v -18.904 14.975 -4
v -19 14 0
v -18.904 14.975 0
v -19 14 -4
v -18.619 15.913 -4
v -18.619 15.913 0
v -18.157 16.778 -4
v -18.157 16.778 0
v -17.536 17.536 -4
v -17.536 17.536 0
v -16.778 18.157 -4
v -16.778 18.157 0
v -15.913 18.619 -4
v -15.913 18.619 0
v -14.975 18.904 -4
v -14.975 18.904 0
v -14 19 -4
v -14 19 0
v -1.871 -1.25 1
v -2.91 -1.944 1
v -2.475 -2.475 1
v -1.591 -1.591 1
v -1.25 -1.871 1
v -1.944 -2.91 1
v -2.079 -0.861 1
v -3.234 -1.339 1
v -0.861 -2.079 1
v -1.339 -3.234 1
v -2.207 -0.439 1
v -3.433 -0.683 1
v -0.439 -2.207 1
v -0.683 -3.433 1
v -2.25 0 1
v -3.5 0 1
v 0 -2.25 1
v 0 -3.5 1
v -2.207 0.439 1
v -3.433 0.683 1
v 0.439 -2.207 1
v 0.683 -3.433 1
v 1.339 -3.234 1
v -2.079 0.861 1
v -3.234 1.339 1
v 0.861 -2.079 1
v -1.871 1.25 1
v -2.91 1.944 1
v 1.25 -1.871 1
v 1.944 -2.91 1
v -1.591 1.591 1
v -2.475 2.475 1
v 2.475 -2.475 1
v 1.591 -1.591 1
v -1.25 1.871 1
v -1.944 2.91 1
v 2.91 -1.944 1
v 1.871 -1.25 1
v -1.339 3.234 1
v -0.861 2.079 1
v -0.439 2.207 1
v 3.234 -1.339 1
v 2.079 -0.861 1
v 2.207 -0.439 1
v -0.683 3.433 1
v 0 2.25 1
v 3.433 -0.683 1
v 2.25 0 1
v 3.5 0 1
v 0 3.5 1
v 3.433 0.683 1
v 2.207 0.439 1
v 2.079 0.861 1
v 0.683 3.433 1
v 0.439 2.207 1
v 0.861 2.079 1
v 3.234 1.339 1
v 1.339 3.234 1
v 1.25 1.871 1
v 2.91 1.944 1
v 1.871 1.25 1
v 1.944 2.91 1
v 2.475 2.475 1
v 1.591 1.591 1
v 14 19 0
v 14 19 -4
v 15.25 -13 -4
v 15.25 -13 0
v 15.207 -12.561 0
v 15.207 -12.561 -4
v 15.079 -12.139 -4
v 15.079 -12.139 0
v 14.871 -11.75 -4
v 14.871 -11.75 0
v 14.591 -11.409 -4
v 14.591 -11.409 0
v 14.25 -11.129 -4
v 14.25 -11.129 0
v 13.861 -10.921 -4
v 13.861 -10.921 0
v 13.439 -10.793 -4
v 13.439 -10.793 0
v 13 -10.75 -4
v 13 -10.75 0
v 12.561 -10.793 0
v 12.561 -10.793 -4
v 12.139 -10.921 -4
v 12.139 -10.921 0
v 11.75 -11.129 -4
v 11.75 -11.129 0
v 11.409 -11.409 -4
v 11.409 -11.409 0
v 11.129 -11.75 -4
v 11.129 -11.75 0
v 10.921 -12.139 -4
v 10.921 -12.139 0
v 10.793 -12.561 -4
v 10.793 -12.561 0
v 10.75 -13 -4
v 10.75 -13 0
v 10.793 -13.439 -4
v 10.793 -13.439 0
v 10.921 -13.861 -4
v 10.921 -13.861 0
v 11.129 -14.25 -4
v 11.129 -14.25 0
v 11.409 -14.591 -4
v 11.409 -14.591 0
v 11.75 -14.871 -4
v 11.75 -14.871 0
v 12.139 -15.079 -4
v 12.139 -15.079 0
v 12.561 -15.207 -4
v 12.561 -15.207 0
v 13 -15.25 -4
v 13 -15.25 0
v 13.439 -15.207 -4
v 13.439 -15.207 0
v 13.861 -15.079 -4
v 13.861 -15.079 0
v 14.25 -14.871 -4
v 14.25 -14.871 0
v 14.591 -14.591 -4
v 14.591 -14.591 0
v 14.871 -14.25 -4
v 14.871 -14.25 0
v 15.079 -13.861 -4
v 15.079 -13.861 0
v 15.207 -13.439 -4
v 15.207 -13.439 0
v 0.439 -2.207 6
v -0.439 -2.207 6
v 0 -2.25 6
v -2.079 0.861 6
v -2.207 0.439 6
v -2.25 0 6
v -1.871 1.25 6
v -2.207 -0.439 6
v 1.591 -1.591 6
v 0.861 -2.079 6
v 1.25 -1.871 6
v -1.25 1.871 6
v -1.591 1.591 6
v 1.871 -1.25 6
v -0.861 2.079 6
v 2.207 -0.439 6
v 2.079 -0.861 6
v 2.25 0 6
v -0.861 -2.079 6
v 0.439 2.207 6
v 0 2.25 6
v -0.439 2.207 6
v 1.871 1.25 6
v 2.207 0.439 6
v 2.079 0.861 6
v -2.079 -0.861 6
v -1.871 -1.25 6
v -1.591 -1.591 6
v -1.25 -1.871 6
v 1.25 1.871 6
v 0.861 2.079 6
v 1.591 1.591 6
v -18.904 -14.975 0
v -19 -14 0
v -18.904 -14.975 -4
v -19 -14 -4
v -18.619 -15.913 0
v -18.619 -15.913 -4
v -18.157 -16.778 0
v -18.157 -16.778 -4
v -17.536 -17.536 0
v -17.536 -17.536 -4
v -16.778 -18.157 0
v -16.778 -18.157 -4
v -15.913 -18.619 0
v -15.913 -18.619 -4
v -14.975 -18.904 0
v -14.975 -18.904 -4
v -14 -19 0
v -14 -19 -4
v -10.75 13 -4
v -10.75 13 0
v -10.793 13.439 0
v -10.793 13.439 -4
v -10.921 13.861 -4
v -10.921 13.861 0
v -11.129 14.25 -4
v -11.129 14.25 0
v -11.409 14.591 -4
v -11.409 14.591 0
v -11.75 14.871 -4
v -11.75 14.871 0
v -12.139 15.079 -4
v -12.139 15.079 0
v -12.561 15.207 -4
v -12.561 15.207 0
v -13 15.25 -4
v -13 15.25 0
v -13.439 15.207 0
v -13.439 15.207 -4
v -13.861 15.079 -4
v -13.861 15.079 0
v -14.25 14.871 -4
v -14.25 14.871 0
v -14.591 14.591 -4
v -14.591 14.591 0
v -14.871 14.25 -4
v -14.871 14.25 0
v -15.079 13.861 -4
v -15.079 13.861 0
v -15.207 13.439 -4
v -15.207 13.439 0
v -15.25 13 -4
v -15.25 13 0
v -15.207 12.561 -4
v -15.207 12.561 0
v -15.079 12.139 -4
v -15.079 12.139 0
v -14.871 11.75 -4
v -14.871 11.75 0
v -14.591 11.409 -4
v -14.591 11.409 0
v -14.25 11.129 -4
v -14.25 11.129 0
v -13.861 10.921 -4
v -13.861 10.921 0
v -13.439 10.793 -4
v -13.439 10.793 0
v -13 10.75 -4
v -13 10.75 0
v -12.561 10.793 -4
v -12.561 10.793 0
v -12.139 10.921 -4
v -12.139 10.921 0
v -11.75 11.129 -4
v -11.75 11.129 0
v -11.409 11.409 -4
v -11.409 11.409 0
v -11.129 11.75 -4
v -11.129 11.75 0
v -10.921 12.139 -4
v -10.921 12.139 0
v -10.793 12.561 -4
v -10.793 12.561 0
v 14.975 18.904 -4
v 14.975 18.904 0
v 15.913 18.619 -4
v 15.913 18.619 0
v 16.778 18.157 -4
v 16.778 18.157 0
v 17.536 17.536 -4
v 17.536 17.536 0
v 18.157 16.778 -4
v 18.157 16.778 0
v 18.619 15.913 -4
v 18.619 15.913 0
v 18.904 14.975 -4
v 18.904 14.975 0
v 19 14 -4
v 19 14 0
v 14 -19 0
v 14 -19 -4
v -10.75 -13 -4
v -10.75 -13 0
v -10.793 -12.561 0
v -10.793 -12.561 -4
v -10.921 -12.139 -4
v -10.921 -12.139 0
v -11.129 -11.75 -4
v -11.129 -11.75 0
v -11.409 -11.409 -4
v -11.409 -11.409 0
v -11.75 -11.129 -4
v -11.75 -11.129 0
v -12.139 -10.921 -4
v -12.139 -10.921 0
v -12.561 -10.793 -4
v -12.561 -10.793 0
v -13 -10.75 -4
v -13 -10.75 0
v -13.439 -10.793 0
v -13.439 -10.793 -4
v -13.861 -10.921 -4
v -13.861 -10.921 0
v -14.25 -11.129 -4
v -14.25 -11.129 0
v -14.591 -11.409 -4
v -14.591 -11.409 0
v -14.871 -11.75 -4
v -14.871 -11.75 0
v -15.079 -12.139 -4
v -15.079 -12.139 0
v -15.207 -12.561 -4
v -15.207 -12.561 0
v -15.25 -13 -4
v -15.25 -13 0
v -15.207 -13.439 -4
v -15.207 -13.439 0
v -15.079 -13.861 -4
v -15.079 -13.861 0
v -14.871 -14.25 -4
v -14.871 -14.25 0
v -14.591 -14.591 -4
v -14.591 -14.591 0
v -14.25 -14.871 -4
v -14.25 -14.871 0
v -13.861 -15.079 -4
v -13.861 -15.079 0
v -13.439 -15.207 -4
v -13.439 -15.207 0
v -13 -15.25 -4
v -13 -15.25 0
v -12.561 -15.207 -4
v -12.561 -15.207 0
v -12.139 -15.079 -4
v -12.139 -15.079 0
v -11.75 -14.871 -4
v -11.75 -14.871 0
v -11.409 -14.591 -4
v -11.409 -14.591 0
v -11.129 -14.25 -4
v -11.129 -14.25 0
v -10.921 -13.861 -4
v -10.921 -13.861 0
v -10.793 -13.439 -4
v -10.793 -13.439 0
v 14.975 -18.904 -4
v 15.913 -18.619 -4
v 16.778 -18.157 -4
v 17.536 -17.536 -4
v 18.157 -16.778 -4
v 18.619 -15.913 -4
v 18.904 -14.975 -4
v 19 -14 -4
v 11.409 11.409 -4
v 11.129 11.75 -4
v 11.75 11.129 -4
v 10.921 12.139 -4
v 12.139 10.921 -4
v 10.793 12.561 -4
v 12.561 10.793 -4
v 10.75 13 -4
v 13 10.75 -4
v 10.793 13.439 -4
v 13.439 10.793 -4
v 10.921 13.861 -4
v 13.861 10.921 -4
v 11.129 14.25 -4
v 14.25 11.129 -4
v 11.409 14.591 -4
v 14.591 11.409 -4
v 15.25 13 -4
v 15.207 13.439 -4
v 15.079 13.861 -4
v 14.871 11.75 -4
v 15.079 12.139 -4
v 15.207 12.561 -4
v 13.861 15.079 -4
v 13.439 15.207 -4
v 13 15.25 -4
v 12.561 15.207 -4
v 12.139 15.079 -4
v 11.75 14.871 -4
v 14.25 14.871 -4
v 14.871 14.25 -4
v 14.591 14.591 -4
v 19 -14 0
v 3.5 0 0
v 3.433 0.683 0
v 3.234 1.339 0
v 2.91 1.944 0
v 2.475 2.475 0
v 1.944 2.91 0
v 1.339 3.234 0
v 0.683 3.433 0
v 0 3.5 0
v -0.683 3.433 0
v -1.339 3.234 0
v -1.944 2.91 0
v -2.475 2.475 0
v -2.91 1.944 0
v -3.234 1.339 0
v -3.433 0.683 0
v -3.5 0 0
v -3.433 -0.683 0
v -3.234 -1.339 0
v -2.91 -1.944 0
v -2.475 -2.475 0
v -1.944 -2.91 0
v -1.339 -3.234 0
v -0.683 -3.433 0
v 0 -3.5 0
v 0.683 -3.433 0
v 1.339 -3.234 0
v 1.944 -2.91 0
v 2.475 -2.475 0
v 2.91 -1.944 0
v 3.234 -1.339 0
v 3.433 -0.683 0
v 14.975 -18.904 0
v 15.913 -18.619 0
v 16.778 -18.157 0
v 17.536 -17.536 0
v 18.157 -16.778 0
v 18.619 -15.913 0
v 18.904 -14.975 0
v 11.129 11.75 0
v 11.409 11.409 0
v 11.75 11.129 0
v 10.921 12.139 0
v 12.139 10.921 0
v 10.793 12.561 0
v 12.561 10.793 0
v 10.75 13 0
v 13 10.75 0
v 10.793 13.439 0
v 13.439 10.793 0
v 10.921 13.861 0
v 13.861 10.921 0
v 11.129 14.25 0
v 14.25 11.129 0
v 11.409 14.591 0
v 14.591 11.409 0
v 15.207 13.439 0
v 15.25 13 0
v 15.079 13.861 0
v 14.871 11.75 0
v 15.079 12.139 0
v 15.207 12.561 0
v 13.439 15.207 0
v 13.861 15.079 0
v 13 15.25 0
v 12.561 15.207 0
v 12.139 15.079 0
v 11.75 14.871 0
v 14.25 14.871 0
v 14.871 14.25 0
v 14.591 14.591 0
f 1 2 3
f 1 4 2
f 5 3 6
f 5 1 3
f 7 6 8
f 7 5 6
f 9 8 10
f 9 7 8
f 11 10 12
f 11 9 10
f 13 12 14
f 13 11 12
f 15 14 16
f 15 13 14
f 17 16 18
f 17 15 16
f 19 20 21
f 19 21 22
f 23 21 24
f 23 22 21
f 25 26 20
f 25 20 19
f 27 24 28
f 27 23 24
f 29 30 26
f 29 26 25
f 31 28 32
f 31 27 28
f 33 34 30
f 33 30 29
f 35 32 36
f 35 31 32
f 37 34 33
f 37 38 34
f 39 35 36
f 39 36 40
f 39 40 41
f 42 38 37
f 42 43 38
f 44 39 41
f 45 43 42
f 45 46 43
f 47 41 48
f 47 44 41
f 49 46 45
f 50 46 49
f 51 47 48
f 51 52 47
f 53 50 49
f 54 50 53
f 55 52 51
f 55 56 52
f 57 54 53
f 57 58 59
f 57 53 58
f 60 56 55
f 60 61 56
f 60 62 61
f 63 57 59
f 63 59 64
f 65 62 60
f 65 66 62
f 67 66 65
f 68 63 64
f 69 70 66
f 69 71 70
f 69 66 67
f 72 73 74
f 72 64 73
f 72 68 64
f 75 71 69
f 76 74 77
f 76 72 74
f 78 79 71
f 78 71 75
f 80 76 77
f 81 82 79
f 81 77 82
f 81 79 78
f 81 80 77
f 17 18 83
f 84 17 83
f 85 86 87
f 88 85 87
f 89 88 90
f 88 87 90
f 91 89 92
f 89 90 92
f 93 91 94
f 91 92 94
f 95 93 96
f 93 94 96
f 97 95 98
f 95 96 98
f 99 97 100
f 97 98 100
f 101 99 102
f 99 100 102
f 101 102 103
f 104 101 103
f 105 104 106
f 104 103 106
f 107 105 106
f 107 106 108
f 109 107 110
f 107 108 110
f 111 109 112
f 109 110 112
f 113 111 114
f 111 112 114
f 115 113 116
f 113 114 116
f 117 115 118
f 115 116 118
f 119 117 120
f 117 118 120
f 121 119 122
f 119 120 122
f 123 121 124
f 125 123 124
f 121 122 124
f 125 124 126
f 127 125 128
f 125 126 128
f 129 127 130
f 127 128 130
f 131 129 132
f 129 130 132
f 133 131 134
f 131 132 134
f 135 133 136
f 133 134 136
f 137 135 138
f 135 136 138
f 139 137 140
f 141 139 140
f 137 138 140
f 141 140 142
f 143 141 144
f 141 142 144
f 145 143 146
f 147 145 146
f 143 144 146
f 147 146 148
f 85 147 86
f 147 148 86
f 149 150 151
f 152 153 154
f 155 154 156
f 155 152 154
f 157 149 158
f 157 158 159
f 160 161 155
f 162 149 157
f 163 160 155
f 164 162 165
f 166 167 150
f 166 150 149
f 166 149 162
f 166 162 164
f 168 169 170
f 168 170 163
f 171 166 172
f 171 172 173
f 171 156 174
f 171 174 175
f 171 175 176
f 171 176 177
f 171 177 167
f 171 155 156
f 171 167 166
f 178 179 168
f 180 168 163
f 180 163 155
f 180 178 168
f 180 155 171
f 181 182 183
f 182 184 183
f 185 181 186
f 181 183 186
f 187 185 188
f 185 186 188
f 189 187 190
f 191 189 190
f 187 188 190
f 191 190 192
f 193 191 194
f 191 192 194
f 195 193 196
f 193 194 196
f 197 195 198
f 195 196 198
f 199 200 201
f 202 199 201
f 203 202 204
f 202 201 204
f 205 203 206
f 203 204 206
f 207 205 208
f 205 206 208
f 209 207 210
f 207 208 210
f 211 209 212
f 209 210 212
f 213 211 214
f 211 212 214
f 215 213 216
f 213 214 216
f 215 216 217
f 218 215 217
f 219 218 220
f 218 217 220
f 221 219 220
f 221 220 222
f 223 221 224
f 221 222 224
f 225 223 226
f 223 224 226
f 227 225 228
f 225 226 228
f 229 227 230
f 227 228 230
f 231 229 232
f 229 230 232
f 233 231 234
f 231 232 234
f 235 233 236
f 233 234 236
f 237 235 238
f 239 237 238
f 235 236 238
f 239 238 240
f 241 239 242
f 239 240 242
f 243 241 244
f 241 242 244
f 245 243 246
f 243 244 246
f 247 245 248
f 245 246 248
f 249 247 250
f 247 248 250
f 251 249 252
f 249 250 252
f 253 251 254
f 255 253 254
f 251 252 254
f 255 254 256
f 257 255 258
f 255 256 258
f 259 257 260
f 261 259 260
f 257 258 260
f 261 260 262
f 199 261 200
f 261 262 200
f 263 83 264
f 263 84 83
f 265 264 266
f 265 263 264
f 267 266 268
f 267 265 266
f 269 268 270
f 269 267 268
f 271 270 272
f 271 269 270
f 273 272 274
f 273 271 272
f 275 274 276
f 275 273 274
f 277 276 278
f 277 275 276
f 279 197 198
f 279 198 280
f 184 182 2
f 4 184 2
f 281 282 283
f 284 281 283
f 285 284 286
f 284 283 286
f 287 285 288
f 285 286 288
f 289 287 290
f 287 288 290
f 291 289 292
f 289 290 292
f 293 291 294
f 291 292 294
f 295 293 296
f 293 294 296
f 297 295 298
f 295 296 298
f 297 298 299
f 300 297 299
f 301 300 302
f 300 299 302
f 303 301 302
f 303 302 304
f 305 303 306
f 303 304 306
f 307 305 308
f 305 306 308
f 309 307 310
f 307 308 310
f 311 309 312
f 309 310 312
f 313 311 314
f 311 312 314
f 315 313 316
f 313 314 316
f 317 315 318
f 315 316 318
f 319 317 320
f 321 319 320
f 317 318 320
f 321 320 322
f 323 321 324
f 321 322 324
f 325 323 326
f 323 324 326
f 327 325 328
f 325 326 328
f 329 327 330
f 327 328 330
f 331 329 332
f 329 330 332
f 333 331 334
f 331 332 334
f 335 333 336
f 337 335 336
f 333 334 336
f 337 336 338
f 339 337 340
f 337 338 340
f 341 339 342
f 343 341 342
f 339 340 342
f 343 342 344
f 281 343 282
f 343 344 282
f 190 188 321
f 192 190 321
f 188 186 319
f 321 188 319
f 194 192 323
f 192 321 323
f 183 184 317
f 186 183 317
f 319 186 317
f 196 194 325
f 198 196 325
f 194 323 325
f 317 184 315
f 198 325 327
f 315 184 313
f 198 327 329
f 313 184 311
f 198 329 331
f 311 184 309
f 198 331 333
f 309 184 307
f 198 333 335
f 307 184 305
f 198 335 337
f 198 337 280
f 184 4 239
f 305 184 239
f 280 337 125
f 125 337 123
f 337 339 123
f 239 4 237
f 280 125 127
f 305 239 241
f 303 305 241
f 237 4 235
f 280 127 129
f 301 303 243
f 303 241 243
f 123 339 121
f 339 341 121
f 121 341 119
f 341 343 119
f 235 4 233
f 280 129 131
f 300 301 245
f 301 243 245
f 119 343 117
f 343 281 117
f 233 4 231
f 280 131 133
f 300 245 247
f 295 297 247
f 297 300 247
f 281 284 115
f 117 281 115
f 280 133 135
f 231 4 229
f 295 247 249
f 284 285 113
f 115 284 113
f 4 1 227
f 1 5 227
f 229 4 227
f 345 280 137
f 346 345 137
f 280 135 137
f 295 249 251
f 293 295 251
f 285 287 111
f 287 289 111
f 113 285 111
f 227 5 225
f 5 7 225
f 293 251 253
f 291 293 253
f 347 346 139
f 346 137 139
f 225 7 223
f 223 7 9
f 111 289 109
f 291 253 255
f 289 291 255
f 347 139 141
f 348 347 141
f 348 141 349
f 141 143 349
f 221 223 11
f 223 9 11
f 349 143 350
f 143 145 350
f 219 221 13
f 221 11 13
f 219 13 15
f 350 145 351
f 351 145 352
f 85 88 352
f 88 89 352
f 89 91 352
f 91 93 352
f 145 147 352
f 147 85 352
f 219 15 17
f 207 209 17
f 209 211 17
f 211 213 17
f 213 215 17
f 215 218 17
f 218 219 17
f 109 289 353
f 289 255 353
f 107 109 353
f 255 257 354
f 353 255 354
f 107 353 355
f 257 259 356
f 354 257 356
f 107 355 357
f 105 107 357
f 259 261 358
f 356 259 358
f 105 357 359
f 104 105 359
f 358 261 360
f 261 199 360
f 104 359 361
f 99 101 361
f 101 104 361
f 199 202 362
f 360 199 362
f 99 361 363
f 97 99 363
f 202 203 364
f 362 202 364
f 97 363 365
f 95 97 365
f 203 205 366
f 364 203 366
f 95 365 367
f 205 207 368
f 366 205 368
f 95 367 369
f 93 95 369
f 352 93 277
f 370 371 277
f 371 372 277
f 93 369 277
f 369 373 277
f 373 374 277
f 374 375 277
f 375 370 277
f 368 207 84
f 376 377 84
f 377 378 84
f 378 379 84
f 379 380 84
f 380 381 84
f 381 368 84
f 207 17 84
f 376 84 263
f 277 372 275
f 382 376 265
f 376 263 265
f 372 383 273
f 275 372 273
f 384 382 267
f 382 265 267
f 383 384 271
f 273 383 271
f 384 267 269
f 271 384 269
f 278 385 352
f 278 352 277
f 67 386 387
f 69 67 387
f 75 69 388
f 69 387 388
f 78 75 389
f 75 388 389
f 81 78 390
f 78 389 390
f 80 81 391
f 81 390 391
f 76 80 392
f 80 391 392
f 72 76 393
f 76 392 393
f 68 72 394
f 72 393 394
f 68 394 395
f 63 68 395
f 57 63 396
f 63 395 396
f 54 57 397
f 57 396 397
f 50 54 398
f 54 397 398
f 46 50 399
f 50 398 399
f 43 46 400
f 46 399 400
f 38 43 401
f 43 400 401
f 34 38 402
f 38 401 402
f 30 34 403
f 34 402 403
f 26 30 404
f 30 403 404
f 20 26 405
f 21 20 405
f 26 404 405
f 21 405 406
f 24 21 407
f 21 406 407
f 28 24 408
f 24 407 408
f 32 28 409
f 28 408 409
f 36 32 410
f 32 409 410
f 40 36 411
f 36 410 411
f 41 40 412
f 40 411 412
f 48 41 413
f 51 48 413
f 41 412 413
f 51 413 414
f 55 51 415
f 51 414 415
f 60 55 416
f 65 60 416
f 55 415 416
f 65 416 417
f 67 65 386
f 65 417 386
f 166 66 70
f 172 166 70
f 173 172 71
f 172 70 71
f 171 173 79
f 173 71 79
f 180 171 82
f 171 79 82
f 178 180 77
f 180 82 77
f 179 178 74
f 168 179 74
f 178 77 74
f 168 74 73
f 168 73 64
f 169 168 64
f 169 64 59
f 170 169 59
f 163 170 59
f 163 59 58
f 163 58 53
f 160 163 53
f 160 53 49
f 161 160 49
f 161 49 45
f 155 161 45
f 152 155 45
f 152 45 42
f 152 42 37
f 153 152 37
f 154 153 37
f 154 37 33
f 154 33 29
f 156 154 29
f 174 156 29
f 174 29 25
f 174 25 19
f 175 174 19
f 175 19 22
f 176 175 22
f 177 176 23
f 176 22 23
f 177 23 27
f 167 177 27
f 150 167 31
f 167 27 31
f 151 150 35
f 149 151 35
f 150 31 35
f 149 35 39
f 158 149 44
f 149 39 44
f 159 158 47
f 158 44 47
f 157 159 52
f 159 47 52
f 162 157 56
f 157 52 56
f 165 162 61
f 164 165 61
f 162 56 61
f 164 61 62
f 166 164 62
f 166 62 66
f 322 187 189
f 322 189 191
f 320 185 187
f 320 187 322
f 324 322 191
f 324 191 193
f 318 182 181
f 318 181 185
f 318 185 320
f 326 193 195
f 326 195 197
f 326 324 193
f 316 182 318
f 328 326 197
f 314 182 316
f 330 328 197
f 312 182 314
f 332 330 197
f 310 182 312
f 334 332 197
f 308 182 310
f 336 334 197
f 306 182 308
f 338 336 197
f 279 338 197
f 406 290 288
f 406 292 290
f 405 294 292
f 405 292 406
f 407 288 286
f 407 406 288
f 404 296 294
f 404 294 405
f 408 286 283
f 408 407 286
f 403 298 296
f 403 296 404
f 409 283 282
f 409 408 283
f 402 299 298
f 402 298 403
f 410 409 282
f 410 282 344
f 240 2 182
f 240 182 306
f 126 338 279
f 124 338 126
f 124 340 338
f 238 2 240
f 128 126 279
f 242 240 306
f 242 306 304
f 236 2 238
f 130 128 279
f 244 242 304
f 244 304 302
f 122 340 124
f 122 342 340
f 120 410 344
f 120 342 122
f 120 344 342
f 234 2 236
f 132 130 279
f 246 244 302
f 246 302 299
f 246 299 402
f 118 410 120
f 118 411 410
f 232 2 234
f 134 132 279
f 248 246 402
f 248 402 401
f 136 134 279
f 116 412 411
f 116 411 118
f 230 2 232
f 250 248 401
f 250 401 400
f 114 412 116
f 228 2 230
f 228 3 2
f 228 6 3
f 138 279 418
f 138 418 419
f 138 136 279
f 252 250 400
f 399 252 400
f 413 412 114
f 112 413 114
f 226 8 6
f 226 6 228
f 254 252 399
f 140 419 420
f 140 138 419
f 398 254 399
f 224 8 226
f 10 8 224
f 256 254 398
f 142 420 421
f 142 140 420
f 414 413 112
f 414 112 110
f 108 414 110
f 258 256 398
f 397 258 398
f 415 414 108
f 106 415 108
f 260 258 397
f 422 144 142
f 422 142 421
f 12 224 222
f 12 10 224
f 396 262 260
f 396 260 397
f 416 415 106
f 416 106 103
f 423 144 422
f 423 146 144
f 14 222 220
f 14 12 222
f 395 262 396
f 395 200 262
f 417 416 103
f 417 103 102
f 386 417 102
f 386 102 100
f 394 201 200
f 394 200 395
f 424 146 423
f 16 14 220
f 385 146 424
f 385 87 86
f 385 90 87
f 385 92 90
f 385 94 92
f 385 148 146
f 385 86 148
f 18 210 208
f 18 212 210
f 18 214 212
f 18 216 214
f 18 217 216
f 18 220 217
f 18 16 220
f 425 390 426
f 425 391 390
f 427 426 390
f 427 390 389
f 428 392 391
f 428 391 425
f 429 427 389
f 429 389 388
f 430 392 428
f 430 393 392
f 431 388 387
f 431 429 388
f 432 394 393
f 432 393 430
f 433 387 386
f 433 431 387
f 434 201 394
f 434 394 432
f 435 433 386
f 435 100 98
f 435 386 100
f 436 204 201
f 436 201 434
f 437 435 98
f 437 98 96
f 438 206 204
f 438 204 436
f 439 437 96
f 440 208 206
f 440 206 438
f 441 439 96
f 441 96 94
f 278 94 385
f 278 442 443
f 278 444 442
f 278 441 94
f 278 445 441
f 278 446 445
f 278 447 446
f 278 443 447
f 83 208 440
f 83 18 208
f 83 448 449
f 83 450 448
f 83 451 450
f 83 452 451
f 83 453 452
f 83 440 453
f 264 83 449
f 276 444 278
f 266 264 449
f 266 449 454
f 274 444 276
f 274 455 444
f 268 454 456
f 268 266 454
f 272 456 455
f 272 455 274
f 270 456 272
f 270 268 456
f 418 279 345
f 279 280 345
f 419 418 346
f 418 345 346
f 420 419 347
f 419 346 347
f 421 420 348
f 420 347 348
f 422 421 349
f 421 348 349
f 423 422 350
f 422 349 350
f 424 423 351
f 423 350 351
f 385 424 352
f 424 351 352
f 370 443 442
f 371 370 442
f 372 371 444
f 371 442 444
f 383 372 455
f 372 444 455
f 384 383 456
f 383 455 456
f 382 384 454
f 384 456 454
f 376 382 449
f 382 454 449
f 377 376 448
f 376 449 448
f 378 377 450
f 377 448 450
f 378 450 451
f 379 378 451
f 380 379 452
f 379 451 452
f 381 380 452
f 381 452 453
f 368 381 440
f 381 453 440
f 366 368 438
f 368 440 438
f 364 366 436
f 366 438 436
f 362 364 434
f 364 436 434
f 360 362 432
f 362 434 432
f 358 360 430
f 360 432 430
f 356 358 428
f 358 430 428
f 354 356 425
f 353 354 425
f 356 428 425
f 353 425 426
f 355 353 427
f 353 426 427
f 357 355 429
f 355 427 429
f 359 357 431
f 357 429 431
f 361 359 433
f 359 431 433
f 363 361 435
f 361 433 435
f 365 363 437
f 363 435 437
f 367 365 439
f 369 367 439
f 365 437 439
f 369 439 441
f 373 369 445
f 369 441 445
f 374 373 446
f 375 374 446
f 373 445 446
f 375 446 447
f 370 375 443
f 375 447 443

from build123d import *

# Parameters (mm, degrees)
F0_W     = 38
F0_H     = 38
F0_R     = 2.25
F0_R_2   = 3.5
F1_DEPTH = 4
F2_DEPTH = 1
F3_DEPTH = 6
F4_R     = 5


with BuildPart() as f1:
    # F0 (on Top) → F1 (new body)
    with BuildSketch(Plane.XY):
        Rectangle(F0_W, F0_H)
        with Locations((-13, -13)):
            Circle(F0_R, mode=Mode.SUBTRACT)
        with Locations((13, -13)):
            Circle(F0_R, mode=Mode.SUBTRACT)
        with Locations((-13, 13)):
            Circle(F0_R, mode=Mode.SUBTRACT)
        Circle(F0_R_2, mode=Mode.SUBTRACT)
        with Locations((13, 13)):
            Circle(F0_R, mode=Mode.SUBTRACT)
        Circle(F0_R_2)
        Circle(F0_R, mode=Mode.SUBTRACT)
        Circle(F0_R)
    extrude(amount=-F1_DEPTH)

    # F0 (on Top) → F2 (join)
    with BuildSketch(Plane.XY):
        Circle(F0_R_2)
        Circle(F0_R, mode=Mode.SUBTRACT)
    extrude(amount=F2_DEPTH)

    # F0 (on Top) → F3 (join)
    with BuildSketch(Plane.XY):
        Circle(F0_R)
    extrude(amount=F3_DEPTH)

    # F4
    f4_edges = [f1.edges().sort_by_distance(p)[0] for p in [
        (-19, -19, -2),
        (19, -19, -2),
        (19, 19, -2),
        (-19, 19, -2),
    ]]
    fillet(f4_edges, radius=F4_R)


solid = f1.part
